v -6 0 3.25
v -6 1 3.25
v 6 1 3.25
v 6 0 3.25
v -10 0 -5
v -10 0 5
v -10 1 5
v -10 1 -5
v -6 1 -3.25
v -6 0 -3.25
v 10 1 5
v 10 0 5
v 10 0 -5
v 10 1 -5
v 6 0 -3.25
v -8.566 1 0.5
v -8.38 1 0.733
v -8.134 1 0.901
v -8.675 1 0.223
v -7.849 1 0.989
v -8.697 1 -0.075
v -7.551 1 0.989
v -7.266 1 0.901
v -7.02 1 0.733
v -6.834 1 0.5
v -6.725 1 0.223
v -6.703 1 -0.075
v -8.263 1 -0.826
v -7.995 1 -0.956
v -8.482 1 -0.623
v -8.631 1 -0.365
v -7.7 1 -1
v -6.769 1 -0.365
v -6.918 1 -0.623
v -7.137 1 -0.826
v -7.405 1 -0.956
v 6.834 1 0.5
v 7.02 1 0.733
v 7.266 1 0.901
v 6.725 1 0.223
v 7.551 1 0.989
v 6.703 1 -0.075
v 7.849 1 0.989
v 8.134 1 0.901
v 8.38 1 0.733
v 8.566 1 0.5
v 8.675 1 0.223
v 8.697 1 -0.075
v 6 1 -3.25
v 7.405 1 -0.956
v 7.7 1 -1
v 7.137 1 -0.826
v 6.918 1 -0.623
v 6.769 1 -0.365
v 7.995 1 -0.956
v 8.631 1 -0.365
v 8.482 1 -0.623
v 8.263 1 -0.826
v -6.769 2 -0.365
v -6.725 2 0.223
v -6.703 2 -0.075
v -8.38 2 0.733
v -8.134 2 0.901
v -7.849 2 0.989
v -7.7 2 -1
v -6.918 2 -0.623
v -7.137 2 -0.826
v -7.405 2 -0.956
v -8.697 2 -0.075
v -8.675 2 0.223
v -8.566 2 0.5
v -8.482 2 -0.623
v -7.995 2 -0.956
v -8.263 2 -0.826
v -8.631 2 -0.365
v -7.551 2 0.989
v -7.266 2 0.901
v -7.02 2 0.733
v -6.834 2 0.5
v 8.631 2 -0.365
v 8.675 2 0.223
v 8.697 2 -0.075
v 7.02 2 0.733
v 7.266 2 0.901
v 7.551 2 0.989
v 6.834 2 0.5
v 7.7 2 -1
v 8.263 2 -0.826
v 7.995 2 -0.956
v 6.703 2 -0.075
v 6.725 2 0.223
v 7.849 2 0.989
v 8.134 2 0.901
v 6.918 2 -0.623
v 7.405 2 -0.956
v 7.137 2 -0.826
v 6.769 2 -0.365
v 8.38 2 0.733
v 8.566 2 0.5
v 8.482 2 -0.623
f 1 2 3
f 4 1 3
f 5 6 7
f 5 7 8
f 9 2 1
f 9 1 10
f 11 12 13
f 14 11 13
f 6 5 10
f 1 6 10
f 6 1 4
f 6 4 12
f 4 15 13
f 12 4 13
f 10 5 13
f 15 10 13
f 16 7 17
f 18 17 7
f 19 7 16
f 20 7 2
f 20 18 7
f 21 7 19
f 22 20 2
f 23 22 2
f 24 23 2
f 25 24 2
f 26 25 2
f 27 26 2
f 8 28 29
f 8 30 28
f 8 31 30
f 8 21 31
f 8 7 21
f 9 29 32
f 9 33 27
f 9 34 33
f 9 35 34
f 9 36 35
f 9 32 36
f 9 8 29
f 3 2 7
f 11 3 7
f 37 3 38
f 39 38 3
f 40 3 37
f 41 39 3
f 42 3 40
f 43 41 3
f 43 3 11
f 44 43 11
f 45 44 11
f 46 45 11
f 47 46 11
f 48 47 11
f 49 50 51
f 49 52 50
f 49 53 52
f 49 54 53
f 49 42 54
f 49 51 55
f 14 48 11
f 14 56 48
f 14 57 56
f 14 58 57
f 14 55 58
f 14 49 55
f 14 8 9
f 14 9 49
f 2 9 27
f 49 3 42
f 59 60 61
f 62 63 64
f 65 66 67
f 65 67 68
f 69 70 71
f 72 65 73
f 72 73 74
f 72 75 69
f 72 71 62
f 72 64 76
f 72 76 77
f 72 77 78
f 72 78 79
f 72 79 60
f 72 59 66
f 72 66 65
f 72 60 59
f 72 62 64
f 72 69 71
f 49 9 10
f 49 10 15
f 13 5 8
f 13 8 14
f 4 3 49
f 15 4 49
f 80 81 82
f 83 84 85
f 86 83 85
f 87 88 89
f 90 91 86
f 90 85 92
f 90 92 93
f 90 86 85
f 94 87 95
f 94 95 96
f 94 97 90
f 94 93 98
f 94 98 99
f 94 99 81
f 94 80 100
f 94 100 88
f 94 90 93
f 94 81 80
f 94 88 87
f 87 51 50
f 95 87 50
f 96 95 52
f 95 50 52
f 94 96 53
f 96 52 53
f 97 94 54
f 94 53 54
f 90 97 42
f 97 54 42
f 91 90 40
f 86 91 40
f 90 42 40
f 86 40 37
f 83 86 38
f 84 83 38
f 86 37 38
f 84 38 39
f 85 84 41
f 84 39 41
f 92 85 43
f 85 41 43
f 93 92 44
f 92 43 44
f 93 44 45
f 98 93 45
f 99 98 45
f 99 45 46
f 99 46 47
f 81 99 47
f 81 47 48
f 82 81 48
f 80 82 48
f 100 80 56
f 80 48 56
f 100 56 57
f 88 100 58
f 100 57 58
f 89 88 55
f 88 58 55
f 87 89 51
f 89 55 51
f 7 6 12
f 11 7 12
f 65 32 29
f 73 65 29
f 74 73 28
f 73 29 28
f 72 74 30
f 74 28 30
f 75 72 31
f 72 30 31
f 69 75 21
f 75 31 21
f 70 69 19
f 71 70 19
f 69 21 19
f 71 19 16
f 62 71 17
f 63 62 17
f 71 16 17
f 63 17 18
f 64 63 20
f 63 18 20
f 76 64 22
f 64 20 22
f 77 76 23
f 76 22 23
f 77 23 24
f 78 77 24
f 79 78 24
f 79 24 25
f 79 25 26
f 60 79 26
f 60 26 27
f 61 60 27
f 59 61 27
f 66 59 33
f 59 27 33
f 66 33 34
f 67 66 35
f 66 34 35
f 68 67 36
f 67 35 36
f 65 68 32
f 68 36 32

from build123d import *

# Parameters (mm, degrees)
SKETCH1_W           = 20
SKETCH1_H           = 10
BOSS_EXTRUDE1_DEPTH = 1
SKETCH2_W           = 12
SKETCH2_H           = 6.5
CUT_EXTRUDE1_DEPTH  = 4
SKETCH3_R           = 1
BOSS_EXTRUDE2_DEPTH = 1


with BuildPart() as part:
    # Sketch1 → Boss-Extrude1 (new body)
    with BuildSketch(Plane(origin=(0, 0, 0), x_dir=(1, 0, 0), z_dir=(0, 1, 0))):
        Rectangle(SKETCH1_W, SKETCH1_H)
    extrude(amount=BOSS_EXTRUDE1_DEPTH)

    # Sketch2 → Cut-Extrude1 (cut)
    with BuildSketch(Plane(origin=(0, 1, 0), x_dir=(1, 0, 0), z_dir=(0, 1, 0))):
        Rectangle(SKETCH2_W, SKETCH2_H)
    extrude(amount=-CUT_EXTRUDE1_DEPTH, mode=Mode.SUBTRACT)

    # Sketch3 → Boss-Extrude2 (add)
    with BuildSketch(Plane(origin=(0, 1, 0), x_dir=(1, 0, 0), z_dir=(0, 1, 0))):
        with Locations(Location((-7.7, 0, 0), (0, 0, 90))):
            Circle(SKETCH3_R)
        with Locations(Location((7.7, 0, 0), (0, 0, 90))):
            Circle(SKETCH3_R)
    extrude(amount=BOSS_EXTRUDE2_DEPTH)


solid = part.part
